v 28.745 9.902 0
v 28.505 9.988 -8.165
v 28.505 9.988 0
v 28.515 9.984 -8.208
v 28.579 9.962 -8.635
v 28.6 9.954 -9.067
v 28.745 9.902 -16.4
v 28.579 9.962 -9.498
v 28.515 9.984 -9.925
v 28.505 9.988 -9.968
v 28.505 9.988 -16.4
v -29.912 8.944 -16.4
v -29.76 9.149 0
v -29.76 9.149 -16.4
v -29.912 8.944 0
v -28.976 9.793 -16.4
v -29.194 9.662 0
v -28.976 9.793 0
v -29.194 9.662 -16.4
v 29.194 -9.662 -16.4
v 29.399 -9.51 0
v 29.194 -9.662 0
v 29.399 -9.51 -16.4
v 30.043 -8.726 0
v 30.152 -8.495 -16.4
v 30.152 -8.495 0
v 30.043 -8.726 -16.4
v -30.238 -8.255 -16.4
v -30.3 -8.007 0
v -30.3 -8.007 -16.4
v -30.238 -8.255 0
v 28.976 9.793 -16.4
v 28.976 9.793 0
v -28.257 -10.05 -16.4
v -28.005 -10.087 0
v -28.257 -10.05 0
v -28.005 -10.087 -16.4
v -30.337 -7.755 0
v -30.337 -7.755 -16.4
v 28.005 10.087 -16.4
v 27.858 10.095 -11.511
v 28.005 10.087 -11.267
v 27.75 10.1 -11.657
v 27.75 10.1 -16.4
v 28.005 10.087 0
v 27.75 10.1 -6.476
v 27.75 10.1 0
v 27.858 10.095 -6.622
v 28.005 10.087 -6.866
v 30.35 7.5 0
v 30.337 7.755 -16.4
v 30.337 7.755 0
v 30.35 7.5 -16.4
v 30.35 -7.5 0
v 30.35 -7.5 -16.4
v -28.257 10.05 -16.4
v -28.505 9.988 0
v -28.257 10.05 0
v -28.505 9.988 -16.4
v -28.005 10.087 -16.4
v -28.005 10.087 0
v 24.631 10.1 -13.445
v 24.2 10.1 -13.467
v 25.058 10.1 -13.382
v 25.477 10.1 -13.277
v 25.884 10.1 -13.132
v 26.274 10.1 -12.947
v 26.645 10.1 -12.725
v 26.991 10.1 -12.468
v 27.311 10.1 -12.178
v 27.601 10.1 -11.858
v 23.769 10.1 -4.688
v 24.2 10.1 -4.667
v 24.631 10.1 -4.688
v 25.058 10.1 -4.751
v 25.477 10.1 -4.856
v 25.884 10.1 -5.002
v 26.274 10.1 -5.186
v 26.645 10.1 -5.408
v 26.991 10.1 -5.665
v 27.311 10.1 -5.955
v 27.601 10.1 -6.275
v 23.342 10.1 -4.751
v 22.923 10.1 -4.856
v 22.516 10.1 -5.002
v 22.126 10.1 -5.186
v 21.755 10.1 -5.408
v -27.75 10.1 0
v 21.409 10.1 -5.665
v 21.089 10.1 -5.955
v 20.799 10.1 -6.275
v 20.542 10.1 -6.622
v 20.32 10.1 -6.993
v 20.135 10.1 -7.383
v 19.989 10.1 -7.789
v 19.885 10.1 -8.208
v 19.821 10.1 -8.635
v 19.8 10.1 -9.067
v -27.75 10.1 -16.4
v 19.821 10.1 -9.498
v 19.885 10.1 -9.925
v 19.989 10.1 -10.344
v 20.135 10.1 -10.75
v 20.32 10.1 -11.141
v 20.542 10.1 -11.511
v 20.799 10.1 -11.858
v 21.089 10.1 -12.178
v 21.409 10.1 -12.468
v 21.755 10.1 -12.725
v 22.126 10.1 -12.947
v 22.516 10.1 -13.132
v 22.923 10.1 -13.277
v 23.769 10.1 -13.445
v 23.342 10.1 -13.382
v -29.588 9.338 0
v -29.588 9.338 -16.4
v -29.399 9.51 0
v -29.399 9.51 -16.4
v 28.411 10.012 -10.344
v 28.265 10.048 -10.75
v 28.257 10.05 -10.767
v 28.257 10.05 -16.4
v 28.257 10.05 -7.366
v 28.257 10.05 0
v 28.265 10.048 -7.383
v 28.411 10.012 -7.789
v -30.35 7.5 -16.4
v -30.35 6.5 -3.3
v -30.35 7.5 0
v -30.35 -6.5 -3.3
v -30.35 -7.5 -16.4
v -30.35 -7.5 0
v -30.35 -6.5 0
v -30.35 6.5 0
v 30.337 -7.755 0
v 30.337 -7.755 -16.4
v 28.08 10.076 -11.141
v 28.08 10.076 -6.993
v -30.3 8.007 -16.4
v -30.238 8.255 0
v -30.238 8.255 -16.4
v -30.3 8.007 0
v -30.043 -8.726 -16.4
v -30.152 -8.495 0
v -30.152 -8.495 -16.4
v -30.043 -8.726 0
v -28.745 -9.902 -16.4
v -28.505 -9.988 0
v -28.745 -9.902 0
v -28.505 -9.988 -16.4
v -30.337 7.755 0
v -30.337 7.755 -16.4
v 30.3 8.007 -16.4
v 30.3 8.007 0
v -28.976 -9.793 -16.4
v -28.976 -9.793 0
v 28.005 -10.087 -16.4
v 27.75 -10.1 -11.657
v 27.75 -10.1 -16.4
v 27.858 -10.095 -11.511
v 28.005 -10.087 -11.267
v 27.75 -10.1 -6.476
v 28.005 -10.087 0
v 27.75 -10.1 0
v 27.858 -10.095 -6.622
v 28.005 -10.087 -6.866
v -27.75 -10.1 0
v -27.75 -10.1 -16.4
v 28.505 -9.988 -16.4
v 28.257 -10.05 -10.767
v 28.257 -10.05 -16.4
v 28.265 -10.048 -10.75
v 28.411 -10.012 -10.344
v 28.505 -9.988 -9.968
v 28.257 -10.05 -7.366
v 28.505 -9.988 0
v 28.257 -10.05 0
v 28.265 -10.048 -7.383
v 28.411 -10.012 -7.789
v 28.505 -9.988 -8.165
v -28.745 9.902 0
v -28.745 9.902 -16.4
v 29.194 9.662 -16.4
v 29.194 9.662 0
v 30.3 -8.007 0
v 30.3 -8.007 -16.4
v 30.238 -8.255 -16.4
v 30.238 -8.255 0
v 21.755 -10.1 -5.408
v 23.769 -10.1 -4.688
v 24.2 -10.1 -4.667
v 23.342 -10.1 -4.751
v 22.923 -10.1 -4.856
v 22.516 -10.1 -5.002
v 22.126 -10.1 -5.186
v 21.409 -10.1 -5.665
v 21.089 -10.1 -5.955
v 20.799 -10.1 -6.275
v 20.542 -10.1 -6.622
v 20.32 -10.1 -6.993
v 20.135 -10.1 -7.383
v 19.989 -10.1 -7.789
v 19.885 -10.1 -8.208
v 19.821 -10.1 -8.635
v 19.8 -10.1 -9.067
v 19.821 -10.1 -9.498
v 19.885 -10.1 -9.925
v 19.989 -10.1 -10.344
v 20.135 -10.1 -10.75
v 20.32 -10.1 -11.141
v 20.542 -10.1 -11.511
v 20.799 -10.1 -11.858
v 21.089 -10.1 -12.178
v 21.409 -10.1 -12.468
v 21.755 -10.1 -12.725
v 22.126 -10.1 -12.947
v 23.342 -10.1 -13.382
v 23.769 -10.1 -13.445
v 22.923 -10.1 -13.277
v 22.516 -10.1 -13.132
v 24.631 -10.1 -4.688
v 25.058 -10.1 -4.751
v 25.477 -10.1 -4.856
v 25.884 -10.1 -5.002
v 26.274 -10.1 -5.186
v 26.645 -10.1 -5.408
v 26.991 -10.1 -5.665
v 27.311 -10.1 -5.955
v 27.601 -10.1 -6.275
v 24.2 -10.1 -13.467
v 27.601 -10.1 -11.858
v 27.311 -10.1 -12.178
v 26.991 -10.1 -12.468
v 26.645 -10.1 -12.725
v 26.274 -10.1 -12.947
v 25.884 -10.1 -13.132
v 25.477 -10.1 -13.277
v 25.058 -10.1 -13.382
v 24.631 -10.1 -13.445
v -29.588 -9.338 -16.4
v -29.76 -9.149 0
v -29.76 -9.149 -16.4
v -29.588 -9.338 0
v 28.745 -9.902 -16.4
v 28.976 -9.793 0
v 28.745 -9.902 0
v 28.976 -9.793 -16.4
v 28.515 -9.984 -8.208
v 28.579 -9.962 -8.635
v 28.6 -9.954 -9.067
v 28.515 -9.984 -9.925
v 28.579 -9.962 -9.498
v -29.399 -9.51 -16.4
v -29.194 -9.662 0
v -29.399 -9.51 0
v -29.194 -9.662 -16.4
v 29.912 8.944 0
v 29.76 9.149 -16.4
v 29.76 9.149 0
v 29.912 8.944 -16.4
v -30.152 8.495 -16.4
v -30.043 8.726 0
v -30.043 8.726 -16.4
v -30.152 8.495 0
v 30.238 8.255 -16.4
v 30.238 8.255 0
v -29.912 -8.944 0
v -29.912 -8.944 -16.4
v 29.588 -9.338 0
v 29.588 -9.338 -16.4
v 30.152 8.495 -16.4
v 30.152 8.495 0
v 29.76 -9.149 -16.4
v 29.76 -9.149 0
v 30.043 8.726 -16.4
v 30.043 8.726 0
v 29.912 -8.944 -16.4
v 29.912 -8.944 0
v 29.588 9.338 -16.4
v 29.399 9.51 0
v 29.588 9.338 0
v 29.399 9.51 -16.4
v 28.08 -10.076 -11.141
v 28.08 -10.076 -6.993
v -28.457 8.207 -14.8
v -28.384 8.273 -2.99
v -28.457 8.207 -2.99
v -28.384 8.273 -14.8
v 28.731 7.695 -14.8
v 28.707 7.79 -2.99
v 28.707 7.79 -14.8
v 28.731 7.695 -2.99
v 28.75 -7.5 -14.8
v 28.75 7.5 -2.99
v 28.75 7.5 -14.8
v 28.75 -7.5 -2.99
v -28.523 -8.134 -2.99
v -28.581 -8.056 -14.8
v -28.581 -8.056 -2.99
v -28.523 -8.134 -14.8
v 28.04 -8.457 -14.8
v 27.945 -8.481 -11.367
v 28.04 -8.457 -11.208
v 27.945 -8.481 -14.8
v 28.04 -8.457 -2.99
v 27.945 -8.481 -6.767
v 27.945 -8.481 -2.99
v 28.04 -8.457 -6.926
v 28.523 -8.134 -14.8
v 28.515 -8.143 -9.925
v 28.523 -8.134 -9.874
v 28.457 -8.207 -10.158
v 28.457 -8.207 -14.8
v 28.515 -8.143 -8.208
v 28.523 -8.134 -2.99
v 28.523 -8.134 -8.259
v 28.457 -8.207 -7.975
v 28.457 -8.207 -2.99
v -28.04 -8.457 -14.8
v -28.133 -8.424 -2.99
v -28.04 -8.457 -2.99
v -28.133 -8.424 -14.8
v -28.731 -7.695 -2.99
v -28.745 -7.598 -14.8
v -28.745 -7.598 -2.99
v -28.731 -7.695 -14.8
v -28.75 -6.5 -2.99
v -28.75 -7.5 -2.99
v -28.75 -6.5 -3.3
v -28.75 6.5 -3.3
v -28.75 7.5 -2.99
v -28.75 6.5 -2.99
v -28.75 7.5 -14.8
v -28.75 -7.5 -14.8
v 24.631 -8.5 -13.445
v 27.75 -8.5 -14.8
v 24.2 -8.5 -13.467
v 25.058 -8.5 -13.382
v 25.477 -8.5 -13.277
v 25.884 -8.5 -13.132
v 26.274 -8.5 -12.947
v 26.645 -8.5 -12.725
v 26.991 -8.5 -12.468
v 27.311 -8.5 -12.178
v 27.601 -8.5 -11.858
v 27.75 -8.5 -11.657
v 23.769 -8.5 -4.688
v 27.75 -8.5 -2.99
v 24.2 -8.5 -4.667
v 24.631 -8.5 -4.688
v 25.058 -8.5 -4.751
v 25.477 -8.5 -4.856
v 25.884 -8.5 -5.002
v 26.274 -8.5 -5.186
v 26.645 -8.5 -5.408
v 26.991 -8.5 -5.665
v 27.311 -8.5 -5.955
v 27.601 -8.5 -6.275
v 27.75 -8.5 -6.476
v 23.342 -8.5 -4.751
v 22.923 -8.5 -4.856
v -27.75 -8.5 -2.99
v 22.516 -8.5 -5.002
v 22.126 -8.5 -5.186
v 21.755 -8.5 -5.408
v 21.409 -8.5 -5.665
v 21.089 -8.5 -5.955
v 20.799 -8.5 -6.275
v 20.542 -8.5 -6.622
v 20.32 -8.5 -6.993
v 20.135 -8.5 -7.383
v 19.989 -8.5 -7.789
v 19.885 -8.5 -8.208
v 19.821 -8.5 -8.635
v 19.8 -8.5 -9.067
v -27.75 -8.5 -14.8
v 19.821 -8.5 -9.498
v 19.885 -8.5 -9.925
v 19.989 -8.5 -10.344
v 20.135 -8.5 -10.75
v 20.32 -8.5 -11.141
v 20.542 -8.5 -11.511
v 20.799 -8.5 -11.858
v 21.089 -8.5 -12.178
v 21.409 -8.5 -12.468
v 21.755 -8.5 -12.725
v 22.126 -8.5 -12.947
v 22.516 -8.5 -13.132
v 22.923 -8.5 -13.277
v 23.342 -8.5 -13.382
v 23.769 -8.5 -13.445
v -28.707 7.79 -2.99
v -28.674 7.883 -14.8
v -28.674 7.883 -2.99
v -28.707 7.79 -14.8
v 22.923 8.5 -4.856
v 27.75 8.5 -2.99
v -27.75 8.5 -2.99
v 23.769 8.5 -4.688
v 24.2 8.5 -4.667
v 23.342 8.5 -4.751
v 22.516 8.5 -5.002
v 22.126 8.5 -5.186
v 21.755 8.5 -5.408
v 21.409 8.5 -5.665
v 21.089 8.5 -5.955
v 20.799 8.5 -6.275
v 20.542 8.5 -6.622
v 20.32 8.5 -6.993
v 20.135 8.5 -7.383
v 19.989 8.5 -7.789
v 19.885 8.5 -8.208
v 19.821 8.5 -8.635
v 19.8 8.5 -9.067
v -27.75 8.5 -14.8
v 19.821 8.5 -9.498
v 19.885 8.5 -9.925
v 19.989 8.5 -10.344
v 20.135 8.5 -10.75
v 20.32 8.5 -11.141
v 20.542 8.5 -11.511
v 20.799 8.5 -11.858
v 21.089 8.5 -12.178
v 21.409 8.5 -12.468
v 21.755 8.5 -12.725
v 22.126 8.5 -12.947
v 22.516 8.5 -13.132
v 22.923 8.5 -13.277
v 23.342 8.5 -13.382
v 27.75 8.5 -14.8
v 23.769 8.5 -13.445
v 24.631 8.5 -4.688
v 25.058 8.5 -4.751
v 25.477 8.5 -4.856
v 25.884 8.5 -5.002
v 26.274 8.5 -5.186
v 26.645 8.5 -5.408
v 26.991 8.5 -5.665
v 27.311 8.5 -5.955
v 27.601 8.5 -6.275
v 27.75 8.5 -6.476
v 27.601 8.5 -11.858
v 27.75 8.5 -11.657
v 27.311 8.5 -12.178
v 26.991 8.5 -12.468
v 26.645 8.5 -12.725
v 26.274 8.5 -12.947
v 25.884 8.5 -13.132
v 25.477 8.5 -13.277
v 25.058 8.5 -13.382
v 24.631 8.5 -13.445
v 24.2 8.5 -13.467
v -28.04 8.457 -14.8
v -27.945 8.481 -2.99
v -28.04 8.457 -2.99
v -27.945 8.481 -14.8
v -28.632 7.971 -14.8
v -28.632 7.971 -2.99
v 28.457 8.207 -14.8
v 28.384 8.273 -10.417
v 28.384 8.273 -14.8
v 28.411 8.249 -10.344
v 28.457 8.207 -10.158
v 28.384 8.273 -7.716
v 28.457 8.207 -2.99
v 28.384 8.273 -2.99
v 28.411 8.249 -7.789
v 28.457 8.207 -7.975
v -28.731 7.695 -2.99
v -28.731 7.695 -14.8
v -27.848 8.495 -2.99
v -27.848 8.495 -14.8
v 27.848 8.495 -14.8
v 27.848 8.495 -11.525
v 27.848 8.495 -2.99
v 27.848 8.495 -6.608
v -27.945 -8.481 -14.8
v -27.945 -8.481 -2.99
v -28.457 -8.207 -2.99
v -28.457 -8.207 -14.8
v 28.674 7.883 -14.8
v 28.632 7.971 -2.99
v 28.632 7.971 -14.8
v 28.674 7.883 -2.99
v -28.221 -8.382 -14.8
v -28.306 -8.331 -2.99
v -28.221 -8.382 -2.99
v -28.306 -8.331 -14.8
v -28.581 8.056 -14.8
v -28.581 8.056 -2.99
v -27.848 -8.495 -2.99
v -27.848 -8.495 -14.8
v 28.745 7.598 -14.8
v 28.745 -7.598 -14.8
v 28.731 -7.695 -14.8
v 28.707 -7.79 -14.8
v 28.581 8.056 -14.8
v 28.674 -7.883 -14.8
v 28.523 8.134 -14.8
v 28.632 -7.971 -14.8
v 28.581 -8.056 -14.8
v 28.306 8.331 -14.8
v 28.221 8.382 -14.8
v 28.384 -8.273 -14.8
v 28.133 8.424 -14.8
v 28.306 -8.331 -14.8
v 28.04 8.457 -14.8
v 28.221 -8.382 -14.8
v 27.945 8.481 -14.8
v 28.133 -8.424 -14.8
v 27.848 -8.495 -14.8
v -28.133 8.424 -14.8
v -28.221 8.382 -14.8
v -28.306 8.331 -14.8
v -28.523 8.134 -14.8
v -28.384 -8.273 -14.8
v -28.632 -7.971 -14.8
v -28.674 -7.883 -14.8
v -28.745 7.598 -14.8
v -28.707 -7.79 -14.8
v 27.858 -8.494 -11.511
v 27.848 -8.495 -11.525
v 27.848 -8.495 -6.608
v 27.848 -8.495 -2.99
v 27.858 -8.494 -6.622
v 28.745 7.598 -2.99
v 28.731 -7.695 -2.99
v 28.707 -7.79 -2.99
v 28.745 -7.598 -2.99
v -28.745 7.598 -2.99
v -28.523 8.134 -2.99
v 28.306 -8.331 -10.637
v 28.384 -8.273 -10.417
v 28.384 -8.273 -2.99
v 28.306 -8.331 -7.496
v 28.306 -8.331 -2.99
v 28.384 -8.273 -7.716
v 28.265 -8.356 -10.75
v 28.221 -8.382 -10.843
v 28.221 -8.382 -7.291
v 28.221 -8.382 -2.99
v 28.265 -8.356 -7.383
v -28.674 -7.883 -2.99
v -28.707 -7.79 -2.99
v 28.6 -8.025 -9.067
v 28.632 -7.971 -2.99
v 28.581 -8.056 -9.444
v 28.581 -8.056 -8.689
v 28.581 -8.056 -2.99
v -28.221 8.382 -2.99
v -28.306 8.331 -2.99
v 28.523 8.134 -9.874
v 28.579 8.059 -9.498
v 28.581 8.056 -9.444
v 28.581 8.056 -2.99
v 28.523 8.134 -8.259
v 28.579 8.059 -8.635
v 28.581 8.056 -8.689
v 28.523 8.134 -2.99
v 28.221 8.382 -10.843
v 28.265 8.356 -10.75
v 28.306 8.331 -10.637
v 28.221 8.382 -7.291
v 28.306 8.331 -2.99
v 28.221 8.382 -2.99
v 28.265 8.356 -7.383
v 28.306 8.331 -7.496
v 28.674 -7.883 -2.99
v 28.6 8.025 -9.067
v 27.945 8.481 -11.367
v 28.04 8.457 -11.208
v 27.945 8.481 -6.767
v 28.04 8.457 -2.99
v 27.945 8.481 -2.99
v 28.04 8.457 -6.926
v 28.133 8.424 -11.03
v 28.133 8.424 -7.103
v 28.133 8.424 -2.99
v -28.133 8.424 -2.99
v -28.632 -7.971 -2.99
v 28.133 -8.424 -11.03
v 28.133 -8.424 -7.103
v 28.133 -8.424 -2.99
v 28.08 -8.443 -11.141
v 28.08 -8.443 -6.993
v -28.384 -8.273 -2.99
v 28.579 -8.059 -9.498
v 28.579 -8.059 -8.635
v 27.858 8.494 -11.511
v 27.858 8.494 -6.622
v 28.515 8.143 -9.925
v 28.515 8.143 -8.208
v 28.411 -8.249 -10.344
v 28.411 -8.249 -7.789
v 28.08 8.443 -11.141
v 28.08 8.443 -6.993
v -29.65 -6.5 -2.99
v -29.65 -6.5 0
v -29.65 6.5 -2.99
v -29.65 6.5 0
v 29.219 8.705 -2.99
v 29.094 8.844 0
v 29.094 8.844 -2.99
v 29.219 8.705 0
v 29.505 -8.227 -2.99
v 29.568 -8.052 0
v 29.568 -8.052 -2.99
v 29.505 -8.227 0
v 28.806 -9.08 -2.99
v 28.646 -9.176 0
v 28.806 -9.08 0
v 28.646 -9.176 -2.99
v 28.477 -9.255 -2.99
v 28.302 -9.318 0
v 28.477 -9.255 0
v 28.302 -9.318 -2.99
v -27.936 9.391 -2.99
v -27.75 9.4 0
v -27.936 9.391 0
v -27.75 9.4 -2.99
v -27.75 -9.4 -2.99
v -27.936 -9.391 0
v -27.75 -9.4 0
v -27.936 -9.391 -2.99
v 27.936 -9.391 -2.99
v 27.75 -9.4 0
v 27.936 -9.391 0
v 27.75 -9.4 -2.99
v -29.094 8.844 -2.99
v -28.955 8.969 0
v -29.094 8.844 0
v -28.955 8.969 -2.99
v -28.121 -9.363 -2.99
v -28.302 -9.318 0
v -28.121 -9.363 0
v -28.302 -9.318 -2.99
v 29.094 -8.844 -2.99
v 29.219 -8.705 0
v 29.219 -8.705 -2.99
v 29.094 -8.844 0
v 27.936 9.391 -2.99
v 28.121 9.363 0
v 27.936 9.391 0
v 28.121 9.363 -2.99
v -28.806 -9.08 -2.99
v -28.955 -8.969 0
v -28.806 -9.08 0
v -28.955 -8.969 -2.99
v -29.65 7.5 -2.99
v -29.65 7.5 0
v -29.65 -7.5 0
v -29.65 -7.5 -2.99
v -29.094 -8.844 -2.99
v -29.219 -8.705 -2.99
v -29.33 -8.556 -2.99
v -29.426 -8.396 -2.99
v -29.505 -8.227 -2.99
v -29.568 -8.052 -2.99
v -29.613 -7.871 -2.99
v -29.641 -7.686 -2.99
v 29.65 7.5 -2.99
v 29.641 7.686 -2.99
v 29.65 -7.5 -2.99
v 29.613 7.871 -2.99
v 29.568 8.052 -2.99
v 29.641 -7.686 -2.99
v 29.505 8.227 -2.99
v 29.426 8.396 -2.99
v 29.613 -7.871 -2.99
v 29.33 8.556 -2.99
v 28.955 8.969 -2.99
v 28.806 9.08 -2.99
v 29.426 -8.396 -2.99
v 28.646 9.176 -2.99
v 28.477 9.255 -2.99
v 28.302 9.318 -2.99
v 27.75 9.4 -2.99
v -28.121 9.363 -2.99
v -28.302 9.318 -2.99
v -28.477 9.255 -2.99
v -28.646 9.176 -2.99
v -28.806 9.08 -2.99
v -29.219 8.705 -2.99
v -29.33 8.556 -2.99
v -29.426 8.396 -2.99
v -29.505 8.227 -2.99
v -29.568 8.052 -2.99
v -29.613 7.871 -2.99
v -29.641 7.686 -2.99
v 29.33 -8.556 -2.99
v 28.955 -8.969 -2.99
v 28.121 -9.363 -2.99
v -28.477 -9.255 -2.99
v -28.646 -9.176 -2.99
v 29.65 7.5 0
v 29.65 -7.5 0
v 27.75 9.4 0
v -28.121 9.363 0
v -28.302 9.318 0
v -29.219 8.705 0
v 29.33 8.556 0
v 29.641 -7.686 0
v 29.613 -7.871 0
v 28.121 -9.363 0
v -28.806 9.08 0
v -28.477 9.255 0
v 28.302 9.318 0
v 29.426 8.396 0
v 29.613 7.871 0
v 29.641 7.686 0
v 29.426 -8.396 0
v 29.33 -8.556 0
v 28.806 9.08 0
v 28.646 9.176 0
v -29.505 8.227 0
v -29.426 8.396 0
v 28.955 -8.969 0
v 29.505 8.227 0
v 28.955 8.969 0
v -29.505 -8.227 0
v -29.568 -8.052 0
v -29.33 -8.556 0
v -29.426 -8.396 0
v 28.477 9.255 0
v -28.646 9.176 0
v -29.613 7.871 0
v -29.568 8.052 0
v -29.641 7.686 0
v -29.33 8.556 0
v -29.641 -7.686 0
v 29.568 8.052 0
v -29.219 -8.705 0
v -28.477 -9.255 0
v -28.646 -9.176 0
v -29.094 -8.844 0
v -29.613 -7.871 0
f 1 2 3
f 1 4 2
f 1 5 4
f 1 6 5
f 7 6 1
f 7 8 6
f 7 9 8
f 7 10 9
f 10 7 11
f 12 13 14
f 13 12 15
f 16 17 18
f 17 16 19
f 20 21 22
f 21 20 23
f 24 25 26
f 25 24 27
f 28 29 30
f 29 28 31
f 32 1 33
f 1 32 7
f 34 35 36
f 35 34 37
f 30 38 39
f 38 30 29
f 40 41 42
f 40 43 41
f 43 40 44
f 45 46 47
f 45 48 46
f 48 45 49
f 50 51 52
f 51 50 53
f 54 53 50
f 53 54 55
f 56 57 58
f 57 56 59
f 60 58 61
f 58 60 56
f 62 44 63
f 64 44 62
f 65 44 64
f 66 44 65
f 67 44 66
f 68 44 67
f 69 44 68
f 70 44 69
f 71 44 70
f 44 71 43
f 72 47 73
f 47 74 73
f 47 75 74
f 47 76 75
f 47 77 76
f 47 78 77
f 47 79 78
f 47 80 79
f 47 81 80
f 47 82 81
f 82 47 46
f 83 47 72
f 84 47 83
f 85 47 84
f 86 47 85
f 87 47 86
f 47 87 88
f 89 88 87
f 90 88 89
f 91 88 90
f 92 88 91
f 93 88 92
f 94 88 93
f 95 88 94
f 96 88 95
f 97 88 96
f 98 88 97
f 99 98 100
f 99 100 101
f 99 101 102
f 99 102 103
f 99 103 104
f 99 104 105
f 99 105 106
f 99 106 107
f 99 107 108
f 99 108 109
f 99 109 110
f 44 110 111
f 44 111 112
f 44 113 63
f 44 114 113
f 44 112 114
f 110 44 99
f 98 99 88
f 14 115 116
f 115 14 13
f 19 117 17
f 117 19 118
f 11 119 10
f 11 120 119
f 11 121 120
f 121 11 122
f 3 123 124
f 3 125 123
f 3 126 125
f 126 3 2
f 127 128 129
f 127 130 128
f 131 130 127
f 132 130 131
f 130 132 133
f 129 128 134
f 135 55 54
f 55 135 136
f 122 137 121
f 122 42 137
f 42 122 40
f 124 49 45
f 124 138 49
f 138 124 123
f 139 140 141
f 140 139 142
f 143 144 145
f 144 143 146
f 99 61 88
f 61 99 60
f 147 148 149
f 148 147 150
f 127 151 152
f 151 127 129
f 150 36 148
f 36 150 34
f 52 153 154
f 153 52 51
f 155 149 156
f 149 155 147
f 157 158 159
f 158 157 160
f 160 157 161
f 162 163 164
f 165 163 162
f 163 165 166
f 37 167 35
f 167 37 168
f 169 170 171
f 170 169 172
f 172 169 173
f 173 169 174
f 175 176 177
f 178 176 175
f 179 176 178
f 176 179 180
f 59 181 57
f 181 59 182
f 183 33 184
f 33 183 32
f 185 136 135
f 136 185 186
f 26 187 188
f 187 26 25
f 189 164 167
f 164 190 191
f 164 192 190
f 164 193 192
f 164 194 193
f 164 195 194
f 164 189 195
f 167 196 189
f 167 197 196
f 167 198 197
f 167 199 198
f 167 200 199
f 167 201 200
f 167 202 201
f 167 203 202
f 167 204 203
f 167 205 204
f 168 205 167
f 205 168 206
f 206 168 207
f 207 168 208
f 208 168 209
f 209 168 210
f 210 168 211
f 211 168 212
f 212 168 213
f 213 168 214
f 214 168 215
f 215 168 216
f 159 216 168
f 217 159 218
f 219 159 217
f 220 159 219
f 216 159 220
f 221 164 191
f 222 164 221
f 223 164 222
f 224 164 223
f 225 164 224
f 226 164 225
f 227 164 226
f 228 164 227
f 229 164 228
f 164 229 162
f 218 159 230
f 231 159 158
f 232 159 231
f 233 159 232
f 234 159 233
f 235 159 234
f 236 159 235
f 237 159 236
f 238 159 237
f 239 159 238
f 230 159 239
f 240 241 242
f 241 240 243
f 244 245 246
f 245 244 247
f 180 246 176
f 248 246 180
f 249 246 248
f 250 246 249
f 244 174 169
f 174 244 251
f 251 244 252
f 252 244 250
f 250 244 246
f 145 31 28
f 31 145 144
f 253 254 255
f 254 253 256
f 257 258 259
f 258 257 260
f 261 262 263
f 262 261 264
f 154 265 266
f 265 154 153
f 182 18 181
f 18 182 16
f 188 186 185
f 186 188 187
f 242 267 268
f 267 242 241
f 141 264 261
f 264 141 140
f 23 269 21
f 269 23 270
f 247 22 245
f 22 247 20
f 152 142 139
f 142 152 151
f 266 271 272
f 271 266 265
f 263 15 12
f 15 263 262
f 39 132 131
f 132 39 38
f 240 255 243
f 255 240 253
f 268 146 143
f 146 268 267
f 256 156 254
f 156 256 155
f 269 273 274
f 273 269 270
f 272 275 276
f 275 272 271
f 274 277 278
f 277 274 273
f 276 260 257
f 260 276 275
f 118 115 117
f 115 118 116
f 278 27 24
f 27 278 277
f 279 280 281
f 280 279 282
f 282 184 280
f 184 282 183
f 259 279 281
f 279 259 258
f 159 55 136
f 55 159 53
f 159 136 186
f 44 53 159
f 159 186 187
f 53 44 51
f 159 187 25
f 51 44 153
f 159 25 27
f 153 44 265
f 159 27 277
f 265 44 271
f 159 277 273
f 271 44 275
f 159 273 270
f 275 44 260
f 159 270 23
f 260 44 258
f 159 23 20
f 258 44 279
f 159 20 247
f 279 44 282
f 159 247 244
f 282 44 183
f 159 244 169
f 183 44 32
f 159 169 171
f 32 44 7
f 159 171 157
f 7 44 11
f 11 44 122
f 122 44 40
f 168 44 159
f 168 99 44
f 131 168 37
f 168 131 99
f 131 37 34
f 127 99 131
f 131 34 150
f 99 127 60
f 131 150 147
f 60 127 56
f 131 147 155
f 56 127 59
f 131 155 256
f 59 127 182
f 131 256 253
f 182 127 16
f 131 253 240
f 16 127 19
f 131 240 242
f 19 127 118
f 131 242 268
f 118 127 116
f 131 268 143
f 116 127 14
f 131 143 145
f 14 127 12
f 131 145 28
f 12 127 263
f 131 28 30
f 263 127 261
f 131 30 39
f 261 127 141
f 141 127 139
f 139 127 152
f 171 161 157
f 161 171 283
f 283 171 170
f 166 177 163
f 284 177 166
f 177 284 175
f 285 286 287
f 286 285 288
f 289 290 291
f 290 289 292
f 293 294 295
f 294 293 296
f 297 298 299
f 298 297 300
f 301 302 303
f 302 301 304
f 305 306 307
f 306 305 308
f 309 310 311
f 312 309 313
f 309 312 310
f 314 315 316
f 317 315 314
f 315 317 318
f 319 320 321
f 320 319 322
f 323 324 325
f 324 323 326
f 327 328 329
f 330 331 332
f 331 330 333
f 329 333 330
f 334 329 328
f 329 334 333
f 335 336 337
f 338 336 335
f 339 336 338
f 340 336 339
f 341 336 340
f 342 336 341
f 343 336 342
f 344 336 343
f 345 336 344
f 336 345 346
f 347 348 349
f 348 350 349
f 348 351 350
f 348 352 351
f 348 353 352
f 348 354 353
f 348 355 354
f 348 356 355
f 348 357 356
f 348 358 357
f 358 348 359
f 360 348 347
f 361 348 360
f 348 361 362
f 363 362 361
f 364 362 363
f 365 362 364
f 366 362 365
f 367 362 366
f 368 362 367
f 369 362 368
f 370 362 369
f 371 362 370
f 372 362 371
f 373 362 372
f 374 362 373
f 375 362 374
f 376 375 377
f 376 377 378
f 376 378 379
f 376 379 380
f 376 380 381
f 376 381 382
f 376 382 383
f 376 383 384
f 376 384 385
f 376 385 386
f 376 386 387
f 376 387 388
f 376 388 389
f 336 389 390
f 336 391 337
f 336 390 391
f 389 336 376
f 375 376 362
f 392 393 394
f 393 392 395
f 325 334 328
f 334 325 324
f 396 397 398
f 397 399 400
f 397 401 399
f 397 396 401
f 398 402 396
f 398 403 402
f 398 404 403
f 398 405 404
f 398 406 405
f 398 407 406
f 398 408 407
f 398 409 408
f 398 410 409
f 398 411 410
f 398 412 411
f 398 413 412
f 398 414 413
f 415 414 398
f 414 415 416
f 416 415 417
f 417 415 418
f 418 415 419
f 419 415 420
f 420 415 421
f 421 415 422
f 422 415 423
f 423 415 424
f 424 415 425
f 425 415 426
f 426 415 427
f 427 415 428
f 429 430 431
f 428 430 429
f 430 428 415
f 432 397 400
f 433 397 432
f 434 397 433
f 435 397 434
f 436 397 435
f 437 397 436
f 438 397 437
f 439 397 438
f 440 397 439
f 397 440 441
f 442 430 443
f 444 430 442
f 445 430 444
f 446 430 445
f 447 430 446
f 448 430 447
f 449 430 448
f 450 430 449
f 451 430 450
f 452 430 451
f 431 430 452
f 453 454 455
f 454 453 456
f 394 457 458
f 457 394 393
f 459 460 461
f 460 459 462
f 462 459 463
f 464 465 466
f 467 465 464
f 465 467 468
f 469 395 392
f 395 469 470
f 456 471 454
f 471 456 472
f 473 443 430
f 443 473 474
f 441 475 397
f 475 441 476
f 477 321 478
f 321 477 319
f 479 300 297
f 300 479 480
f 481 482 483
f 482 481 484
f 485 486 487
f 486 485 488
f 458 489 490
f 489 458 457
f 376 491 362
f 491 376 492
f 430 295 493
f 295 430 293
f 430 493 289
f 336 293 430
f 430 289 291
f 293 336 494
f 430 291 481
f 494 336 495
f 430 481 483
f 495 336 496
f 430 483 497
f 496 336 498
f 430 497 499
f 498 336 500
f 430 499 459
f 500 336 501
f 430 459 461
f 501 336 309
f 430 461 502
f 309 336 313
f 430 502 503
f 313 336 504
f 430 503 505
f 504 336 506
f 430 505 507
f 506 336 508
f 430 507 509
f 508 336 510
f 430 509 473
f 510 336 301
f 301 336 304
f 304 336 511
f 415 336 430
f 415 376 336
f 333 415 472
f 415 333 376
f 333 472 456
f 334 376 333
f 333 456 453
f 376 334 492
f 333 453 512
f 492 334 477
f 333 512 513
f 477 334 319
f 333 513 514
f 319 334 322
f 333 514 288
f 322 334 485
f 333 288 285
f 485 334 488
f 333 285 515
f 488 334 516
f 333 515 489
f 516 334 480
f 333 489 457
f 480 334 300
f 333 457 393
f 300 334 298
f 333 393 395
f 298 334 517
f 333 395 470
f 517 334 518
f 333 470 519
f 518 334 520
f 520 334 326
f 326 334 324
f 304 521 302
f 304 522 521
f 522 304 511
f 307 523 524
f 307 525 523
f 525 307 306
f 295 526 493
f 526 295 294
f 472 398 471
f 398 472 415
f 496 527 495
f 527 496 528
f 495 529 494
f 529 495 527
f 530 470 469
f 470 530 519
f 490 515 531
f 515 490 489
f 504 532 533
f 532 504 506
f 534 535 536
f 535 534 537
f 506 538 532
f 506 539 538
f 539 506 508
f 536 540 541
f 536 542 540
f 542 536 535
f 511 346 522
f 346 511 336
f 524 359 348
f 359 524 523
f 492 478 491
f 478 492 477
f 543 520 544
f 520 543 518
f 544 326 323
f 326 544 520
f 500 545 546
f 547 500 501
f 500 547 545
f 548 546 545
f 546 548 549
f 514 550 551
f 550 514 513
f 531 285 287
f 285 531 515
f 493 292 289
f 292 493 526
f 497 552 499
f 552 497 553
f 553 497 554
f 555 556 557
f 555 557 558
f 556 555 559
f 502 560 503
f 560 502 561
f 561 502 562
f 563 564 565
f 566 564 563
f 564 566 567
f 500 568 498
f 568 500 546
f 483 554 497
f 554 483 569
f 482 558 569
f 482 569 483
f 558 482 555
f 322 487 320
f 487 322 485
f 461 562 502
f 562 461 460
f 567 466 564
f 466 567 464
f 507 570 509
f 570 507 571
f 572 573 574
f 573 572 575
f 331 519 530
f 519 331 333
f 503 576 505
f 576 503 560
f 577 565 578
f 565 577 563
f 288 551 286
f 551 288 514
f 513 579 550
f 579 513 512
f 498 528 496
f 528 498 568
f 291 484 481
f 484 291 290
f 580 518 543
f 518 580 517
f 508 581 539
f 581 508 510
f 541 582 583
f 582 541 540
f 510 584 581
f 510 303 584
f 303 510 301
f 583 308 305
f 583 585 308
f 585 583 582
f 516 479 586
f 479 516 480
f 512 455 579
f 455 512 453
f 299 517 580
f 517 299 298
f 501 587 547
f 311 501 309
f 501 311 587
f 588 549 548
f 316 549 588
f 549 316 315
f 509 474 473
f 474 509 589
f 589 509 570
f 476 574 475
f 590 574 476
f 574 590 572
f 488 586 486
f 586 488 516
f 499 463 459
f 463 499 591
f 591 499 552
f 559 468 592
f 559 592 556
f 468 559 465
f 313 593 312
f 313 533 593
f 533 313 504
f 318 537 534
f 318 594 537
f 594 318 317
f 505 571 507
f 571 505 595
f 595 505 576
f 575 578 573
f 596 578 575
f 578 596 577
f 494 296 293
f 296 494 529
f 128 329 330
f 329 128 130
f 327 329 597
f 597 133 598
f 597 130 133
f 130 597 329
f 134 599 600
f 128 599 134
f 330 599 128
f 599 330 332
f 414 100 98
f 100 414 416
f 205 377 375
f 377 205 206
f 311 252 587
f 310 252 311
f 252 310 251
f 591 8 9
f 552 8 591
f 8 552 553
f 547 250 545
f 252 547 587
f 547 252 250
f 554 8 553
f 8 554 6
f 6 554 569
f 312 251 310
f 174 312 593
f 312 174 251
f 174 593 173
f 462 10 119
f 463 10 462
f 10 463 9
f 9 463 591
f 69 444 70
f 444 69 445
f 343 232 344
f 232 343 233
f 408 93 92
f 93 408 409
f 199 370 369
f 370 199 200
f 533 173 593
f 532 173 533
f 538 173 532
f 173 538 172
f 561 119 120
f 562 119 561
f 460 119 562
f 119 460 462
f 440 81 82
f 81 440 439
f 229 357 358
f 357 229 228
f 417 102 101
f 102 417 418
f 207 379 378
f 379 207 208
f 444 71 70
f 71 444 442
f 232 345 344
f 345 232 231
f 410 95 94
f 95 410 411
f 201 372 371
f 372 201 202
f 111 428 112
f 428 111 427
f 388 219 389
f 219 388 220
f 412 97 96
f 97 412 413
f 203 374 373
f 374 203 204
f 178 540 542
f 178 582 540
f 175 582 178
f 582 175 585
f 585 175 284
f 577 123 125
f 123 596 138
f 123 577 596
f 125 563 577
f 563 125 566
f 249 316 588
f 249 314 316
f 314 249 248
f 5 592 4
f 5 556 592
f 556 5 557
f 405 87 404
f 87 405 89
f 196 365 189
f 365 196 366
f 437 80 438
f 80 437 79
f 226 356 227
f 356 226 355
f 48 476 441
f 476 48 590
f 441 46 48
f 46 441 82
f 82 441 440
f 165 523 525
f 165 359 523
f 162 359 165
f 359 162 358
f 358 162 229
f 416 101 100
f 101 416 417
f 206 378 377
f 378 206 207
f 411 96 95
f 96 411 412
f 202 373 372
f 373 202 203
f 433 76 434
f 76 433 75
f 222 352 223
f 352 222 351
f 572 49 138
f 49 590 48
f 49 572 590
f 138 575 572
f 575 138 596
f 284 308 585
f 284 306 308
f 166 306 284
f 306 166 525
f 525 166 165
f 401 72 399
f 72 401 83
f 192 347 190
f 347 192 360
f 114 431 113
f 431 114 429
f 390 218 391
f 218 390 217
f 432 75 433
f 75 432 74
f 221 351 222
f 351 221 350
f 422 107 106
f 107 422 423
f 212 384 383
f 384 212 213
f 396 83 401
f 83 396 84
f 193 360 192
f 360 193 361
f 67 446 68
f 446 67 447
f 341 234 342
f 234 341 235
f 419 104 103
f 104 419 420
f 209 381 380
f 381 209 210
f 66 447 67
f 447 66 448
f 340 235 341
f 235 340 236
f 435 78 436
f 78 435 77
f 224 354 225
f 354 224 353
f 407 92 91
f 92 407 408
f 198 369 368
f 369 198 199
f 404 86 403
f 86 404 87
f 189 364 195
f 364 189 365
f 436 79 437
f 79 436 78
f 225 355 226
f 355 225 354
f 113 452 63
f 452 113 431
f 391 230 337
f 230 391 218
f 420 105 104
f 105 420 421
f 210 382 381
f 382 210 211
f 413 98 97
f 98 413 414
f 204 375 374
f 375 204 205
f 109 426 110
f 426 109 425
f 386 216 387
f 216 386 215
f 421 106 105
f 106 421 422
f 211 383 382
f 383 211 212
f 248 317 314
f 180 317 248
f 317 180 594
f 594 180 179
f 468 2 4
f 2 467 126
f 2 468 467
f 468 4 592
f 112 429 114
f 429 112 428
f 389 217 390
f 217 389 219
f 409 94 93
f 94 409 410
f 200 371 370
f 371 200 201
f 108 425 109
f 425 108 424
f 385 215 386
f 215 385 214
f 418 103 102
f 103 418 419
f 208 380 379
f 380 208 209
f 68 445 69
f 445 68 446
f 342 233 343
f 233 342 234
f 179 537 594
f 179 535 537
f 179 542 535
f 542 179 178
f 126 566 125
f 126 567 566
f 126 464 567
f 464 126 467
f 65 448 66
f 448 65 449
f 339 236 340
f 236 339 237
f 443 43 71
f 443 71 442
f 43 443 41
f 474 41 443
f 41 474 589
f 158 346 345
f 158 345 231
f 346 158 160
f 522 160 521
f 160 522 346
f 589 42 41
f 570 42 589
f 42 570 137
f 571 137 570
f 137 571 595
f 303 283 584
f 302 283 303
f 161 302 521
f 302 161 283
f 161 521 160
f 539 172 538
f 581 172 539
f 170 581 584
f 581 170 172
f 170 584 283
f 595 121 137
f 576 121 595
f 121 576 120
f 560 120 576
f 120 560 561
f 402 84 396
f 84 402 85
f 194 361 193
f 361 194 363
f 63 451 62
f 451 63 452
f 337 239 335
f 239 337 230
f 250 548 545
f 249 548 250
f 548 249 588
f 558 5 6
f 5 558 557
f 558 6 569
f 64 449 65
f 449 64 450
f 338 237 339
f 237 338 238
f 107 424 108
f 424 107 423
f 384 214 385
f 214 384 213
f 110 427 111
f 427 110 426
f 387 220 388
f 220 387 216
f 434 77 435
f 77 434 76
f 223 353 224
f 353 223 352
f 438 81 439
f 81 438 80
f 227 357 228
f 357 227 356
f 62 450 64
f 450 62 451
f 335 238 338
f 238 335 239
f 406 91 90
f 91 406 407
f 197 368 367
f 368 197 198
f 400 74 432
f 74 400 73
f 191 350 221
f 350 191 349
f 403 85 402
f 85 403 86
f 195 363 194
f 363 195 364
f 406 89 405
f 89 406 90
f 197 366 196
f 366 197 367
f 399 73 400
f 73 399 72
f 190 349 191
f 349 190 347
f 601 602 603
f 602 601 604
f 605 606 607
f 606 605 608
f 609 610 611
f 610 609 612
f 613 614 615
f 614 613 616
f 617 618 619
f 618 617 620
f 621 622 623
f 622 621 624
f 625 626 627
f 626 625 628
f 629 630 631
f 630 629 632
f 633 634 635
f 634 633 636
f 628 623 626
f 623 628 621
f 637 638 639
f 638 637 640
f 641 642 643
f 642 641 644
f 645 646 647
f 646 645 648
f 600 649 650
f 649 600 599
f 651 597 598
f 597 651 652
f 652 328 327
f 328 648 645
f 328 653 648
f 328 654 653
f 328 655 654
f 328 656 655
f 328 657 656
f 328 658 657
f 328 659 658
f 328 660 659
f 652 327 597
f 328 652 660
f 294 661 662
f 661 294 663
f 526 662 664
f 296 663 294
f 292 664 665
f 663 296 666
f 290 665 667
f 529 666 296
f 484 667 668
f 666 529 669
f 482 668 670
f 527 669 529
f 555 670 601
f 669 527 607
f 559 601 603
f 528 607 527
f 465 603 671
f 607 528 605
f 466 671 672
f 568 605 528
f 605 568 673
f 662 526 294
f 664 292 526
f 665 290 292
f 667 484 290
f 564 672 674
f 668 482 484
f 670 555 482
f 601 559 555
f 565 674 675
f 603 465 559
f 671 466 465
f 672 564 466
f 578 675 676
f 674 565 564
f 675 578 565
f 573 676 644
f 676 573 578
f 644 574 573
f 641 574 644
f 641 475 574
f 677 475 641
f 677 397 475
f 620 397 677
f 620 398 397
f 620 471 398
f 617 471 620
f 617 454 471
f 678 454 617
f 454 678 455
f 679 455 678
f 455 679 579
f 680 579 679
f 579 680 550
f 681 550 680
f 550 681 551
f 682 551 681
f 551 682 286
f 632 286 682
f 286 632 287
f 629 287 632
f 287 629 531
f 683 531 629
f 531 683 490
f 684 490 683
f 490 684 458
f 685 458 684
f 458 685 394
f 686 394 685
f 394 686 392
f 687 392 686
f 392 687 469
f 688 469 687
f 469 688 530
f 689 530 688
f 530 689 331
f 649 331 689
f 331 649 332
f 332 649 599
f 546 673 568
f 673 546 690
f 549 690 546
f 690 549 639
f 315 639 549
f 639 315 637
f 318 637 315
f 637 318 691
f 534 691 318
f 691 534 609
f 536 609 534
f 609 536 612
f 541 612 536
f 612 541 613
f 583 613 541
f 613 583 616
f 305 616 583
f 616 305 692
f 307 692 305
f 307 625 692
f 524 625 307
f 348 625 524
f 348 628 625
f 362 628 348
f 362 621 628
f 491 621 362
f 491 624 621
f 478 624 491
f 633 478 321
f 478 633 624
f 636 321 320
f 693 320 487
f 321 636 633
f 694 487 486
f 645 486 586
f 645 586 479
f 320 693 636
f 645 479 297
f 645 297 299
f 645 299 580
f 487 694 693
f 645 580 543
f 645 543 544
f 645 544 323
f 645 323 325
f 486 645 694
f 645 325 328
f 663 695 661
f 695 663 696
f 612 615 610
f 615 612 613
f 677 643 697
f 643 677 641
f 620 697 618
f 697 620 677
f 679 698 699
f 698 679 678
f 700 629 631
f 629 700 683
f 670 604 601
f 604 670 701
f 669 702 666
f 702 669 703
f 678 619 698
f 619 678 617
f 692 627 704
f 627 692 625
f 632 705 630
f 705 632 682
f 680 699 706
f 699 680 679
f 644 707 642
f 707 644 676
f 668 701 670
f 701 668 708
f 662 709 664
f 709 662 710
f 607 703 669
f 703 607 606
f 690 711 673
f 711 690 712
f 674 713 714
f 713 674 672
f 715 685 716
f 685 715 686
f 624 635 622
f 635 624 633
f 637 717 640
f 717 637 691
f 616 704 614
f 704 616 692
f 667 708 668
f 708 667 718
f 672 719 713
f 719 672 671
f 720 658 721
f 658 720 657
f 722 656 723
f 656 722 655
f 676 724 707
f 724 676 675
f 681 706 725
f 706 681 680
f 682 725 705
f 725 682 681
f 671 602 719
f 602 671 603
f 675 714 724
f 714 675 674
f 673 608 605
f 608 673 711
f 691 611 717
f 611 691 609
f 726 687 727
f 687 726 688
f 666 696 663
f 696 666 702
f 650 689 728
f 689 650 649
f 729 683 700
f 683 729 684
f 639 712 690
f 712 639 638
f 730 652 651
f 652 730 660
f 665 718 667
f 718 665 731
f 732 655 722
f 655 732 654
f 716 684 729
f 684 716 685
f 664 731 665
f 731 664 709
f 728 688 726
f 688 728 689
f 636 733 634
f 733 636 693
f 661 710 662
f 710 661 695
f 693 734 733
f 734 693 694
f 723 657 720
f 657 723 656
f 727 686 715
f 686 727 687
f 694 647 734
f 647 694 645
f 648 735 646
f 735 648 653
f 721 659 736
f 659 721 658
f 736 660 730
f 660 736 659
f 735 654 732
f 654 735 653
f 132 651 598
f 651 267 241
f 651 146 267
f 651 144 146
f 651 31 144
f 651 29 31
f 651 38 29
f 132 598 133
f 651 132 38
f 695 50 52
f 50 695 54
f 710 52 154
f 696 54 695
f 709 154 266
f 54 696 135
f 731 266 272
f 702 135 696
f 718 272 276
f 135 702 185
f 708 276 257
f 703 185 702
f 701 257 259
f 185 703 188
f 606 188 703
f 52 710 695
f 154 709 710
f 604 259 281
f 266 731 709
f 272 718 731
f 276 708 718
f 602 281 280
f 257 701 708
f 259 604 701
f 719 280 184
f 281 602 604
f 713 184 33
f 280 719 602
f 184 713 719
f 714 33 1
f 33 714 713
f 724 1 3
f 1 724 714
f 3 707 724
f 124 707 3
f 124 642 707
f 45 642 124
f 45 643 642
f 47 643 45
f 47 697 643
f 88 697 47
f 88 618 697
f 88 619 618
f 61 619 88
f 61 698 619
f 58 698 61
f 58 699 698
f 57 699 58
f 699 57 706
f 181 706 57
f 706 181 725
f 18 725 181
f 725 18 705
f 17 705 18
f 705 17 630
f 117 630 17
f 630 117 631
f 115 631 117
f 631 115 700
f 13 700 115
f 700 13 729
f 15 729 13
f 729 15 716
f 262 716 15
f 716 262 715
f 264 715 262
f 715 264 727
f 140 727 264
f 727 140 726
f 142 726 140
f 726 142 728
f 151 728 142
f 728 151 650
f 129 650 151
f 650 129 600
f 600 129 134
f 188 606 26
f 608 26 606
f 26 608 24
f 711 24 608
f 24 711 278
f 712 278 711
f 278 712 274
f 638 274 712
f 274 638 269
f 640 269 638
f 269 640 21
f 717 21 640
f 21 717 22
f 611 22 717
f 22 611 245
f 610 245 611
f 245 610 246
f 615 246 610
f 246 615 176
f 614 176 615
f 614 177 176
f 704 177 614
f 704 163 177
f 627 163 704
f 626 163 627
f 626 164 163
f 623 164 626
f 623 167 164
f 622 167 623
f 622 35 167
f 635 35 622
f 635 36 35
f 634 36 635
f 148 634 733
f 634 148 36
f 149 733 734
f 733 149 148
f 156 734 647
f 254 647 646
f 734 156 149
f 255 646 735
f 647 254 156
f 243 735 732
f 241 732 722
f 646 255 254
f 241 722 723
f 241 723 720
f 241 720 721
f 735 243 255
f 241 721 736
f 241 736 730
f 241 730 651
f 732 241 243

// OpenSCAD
/*
 * batguard a laptop battery charge manager
 * 
 * Copyright (C) 2025 Simone Pernice pernice@libero.it 
 * 
 * This file is part of batguard.
 *
 * batguard is free software: you can redistribute it and/or modify
 * it under the terms of the GNU General Public License as published by
 * the Free Software Foundation, either version 3 of the License, or
 * (at your option) any later version.
 * 
 * batguard is distributed in the hope that it will be useful,
 * but WITHOUT ANY WARRANTY; without even the implied warranty of
 * MERCHANTABILITY or FITNESS FOR A PARTICULAR PURPOSE.  See the
 * GNU General Public License for more details.
 * 
 * You should have received a copy of the GNU General Public License
 * along with this program.  If not, see <http://www.gnu.org/licenses/>.
 * 
 */
 
epson = 0.01;
wall = [0.4, 0.4, 0.2];

relayDims = [18.9, 15.2, 14.9, 0.8, 3.5];
terminalBlockDims = [8.0, 15.6, 10.0, 1.0, 3.7];
usbConnectorDims = [14.9, 12.2, 4.5, 18.9, 3.5];
pcbDims = [46.6, 16.1, 1.6, 0.2];
eleCableDims = [8, 8, 50, 1];

thickness = 4 * wall.x;
gap = 0.4;
caseDims = [49.5 + eleCableDims.x , 17.0, 19.3, 2];
caseOvlp = 3;
caseGap = 0.1;

$fn = 64;

//0 no slice
//1 slicing parallel to x/z plane
//2 slicing parallel to x/y plane top
//3 slicing parallel to x/y plane bottom
//4 slicing parallel to z/y plane bottom
slice = 0; 

//false no relay
//true show relay 
showRelay = false;

//0 single case 
//1 top case
//2 bottom case
//3 bottom case upside down for printing
//4 top and bottom with 0.1 gap
showCase = 3;

module bottomCase ()
{
    difference ()
    {
        usdRelayroundedCubeCase ();
        cs = 100;
        translate ([0, 0, -cs/2+pcbDims.z+usbConnectorDims.z]) cube (cs, center = true);        
        topCase (thickness/2 + caseGap);
    }
}

module topCase (coltck = thickness/2 - caseGap)
{   
    difference ()
    {
        color ("DarkSlateGray") union ()
        {
            translate ([0,0,pcbDims.z+usbConnectorDims.z-epson]) roundedCollar (caseDims + [0,0,caseOvlp-caseDims.z,0], coltck);
            difference ()
            {                
                usdRelayroundedCubeCase ();
                cs = 100;
                translate ([0, 0, cs/2+pcbDims.z+usbConnectorDims.z]) cube (cs, center = true);
            }
        }
        translate ([0,0,gap]) usbRelay (usbConnectorDims + gap* [0, 2, 2, 0, 0], eleCableDims + 2*gap*[1,1,1,0]);
    }
}
    
module usdRelayroundedCubeCase (dims = caseDims)
{
    difference ()
    {
        color ("DarkSlateGray") union ()
        {
            translate ([0, 0, dims.z/2 + thickness]) difference ()
            {
                roundedCube (dims + 2 * thickness * [1, 1, 1, 1]);
                roundedCube (dims);
            }
            translate ([-caseDims.x/2+pcbDims.x+1.3*thickness, 0, terminalBlockDims [4]/2+thickness-epson]) cube ([thickness, caseDims.y, terminalBlockDims [4]], center = true);
        }
        translate ([0,0,gap]) usbRelay (usbConnectorDims + gap* [0, 2, 2, 0, 0], eleCableDims + 2*gap*[1,1,1,0]);
    }
}

module roundedCollar (dims, thick)
{
    translate ([0, 0, dims.z/2]) difference ()
    {
        roundedCube (dims + 2 * thick * [1, 1, 0, 1]);
        roundedCube (dims + 2 * thick * [0, 0, 1, 0]);
    }
}

module roundedCube (dims)
{
    width = dims [0];
    depth = dims [1];
    height = dims [2];
    curv = dims [3];

    hull () for (i = [-1, 1]) for (j = [-1, 1]) translate ([i*(width - curv)/2, j*(depth - curv)/2, 0]) cylinder (d = curv, h = height, center = true);
}
module relay (dims = relayDims)
{
    width = dims [0];
    depth = dims [1];
    height = dims [2];
    pindia = dims [3];
    pinhei = dims [4];
    
    translate ([0, 0, height/2])
    {
        color ("DeepSkyBlue") cube ([width, depth, height], center = true);
        for (i = [-1, 1]) for (j = [-1, 1]) translate ([i*(width/2 - 3.3), j*(depth/2 -1.9), -height/2-pinhei/2]) color ("silver") cylinder (d = pindia, h = pinhei, center = true);
        translate ([-(width/2 - 0.8), 0, -height/2-pinhei/2]) color ("silver") cylinder (d = pindia, h = pinhei, center = true);
    }
 }
 
 module terminalBlock (dims = terminalBlockDims)
 {
    width = dims [0];
    depth = dims [1];
    height = dims [2];
    pindia = dims [3];
    pinhei = dims [4];
    
    translate ([0, 0, height/2])
    {
        color ("DodgerBlue") cube ([width, depth, height], center = true);
        for (i = [-1, 0, 1]) translate ([0, i*(depth/2 - 3), -height/2-pinhei/2]) color ("silver") cylinder (d = pindia, h = pinhei, center = true);
    }
 }   
 
 module usbConnector (dims = usbConnectorDims)
  {
    width = dims [0];
    depth = dims [1];
    height = dims [2];
    widthin = dims [3];
    heightin = dims [4];
    
    color ("LightGrey") translate ([0, 0, heightin/2+height-heightin])
    {
        cube ([widthin, depth, heightin], center = true);
        translate ([-(widthin-width)/2, 0, -(height-heightin)/2-epson]) cube ([width, depth, height], center = true);
    }
 }   
 
 module pcb (dims = pcbDims)
 {
    width = dims [0];
    depth = dims [1];
    height = dims [2];

    translate ([0, 0, height/2])
    {
        color ("green") cube ([width, depth, height], center = true);
    }
}

module eleCable (dims = eleCableDims)
{
    diameter = dims [0];
    length = dims [2];
    translate ([0, 0, diameter/2]) rotate ([90,0,0]) color ("LightCyan") cylinder (d = diameter, h = length, center = true);
}

module usbRelay (ucd = usbConnectorDims, eld = eleCableDims)
{
    translate ([-(eleCableDims.x+eleCableDims[3])/2, 0, thickness + terminalBlockDims[4]-pcbDims.z]) 
    {
        pcb ();
        translate ([(pcbDims.x-relayDims.x)/2-terminalBlockDims.x - pcbDims [3], 0, pcbDims [3] + pcbDims.z]) relay ();
        translate ([(pcbDims.x-terminalBlockDims.x)/2, 0, pcbDims [3] + pcbDims.z]) terminalBlock ();
        translate ([(-pcbDims.x-ucd.x+ucd[4])/2, 0, pcbDims [3] + pcbDims.z-(ucd.z-ucd[4])]) usbConnector (ucd);
        translate ([(pcbDims.x + eld.x)/2+eld [3], 0, terminalBlockDims.z*2/3]) eleCable (eld);
    }
}

difference ()
{
    union ()
    {
        if (showRelay == true) usbRelay (); 
        if (showCase == 0) usdRelayroundedCubeCase();
        else if (showCase == 1) topCase ();
        else if (showCase == 2) bottomCase ();
        else if (showCase == 3) rotate ([180,0,0]) translate ([0,0,-pcbDims.z-usbConnectorDims.z]) bottomCase ();
        else if (showCase == 4) 
        {
            topCase ();
            translate ([0,0,.1]) bottomCase ();
        }
        else echo ("Wrong showCase Number");
    }
    if (slice == 1) translate ([-50,0,-1]) cube (100);
    else if (slice == 2) translate ([0,0,-50+caseDims.z/2]) cube (100, center = true);
    else if (slice == 3) translate ([0,0,+50+caseDims.z/2]) cube (100, center = true);
    else if (slice == 4) translate ([-50,0,0]) cube (100, center = true);
    else echo ("Wrong Slice Number");
}
